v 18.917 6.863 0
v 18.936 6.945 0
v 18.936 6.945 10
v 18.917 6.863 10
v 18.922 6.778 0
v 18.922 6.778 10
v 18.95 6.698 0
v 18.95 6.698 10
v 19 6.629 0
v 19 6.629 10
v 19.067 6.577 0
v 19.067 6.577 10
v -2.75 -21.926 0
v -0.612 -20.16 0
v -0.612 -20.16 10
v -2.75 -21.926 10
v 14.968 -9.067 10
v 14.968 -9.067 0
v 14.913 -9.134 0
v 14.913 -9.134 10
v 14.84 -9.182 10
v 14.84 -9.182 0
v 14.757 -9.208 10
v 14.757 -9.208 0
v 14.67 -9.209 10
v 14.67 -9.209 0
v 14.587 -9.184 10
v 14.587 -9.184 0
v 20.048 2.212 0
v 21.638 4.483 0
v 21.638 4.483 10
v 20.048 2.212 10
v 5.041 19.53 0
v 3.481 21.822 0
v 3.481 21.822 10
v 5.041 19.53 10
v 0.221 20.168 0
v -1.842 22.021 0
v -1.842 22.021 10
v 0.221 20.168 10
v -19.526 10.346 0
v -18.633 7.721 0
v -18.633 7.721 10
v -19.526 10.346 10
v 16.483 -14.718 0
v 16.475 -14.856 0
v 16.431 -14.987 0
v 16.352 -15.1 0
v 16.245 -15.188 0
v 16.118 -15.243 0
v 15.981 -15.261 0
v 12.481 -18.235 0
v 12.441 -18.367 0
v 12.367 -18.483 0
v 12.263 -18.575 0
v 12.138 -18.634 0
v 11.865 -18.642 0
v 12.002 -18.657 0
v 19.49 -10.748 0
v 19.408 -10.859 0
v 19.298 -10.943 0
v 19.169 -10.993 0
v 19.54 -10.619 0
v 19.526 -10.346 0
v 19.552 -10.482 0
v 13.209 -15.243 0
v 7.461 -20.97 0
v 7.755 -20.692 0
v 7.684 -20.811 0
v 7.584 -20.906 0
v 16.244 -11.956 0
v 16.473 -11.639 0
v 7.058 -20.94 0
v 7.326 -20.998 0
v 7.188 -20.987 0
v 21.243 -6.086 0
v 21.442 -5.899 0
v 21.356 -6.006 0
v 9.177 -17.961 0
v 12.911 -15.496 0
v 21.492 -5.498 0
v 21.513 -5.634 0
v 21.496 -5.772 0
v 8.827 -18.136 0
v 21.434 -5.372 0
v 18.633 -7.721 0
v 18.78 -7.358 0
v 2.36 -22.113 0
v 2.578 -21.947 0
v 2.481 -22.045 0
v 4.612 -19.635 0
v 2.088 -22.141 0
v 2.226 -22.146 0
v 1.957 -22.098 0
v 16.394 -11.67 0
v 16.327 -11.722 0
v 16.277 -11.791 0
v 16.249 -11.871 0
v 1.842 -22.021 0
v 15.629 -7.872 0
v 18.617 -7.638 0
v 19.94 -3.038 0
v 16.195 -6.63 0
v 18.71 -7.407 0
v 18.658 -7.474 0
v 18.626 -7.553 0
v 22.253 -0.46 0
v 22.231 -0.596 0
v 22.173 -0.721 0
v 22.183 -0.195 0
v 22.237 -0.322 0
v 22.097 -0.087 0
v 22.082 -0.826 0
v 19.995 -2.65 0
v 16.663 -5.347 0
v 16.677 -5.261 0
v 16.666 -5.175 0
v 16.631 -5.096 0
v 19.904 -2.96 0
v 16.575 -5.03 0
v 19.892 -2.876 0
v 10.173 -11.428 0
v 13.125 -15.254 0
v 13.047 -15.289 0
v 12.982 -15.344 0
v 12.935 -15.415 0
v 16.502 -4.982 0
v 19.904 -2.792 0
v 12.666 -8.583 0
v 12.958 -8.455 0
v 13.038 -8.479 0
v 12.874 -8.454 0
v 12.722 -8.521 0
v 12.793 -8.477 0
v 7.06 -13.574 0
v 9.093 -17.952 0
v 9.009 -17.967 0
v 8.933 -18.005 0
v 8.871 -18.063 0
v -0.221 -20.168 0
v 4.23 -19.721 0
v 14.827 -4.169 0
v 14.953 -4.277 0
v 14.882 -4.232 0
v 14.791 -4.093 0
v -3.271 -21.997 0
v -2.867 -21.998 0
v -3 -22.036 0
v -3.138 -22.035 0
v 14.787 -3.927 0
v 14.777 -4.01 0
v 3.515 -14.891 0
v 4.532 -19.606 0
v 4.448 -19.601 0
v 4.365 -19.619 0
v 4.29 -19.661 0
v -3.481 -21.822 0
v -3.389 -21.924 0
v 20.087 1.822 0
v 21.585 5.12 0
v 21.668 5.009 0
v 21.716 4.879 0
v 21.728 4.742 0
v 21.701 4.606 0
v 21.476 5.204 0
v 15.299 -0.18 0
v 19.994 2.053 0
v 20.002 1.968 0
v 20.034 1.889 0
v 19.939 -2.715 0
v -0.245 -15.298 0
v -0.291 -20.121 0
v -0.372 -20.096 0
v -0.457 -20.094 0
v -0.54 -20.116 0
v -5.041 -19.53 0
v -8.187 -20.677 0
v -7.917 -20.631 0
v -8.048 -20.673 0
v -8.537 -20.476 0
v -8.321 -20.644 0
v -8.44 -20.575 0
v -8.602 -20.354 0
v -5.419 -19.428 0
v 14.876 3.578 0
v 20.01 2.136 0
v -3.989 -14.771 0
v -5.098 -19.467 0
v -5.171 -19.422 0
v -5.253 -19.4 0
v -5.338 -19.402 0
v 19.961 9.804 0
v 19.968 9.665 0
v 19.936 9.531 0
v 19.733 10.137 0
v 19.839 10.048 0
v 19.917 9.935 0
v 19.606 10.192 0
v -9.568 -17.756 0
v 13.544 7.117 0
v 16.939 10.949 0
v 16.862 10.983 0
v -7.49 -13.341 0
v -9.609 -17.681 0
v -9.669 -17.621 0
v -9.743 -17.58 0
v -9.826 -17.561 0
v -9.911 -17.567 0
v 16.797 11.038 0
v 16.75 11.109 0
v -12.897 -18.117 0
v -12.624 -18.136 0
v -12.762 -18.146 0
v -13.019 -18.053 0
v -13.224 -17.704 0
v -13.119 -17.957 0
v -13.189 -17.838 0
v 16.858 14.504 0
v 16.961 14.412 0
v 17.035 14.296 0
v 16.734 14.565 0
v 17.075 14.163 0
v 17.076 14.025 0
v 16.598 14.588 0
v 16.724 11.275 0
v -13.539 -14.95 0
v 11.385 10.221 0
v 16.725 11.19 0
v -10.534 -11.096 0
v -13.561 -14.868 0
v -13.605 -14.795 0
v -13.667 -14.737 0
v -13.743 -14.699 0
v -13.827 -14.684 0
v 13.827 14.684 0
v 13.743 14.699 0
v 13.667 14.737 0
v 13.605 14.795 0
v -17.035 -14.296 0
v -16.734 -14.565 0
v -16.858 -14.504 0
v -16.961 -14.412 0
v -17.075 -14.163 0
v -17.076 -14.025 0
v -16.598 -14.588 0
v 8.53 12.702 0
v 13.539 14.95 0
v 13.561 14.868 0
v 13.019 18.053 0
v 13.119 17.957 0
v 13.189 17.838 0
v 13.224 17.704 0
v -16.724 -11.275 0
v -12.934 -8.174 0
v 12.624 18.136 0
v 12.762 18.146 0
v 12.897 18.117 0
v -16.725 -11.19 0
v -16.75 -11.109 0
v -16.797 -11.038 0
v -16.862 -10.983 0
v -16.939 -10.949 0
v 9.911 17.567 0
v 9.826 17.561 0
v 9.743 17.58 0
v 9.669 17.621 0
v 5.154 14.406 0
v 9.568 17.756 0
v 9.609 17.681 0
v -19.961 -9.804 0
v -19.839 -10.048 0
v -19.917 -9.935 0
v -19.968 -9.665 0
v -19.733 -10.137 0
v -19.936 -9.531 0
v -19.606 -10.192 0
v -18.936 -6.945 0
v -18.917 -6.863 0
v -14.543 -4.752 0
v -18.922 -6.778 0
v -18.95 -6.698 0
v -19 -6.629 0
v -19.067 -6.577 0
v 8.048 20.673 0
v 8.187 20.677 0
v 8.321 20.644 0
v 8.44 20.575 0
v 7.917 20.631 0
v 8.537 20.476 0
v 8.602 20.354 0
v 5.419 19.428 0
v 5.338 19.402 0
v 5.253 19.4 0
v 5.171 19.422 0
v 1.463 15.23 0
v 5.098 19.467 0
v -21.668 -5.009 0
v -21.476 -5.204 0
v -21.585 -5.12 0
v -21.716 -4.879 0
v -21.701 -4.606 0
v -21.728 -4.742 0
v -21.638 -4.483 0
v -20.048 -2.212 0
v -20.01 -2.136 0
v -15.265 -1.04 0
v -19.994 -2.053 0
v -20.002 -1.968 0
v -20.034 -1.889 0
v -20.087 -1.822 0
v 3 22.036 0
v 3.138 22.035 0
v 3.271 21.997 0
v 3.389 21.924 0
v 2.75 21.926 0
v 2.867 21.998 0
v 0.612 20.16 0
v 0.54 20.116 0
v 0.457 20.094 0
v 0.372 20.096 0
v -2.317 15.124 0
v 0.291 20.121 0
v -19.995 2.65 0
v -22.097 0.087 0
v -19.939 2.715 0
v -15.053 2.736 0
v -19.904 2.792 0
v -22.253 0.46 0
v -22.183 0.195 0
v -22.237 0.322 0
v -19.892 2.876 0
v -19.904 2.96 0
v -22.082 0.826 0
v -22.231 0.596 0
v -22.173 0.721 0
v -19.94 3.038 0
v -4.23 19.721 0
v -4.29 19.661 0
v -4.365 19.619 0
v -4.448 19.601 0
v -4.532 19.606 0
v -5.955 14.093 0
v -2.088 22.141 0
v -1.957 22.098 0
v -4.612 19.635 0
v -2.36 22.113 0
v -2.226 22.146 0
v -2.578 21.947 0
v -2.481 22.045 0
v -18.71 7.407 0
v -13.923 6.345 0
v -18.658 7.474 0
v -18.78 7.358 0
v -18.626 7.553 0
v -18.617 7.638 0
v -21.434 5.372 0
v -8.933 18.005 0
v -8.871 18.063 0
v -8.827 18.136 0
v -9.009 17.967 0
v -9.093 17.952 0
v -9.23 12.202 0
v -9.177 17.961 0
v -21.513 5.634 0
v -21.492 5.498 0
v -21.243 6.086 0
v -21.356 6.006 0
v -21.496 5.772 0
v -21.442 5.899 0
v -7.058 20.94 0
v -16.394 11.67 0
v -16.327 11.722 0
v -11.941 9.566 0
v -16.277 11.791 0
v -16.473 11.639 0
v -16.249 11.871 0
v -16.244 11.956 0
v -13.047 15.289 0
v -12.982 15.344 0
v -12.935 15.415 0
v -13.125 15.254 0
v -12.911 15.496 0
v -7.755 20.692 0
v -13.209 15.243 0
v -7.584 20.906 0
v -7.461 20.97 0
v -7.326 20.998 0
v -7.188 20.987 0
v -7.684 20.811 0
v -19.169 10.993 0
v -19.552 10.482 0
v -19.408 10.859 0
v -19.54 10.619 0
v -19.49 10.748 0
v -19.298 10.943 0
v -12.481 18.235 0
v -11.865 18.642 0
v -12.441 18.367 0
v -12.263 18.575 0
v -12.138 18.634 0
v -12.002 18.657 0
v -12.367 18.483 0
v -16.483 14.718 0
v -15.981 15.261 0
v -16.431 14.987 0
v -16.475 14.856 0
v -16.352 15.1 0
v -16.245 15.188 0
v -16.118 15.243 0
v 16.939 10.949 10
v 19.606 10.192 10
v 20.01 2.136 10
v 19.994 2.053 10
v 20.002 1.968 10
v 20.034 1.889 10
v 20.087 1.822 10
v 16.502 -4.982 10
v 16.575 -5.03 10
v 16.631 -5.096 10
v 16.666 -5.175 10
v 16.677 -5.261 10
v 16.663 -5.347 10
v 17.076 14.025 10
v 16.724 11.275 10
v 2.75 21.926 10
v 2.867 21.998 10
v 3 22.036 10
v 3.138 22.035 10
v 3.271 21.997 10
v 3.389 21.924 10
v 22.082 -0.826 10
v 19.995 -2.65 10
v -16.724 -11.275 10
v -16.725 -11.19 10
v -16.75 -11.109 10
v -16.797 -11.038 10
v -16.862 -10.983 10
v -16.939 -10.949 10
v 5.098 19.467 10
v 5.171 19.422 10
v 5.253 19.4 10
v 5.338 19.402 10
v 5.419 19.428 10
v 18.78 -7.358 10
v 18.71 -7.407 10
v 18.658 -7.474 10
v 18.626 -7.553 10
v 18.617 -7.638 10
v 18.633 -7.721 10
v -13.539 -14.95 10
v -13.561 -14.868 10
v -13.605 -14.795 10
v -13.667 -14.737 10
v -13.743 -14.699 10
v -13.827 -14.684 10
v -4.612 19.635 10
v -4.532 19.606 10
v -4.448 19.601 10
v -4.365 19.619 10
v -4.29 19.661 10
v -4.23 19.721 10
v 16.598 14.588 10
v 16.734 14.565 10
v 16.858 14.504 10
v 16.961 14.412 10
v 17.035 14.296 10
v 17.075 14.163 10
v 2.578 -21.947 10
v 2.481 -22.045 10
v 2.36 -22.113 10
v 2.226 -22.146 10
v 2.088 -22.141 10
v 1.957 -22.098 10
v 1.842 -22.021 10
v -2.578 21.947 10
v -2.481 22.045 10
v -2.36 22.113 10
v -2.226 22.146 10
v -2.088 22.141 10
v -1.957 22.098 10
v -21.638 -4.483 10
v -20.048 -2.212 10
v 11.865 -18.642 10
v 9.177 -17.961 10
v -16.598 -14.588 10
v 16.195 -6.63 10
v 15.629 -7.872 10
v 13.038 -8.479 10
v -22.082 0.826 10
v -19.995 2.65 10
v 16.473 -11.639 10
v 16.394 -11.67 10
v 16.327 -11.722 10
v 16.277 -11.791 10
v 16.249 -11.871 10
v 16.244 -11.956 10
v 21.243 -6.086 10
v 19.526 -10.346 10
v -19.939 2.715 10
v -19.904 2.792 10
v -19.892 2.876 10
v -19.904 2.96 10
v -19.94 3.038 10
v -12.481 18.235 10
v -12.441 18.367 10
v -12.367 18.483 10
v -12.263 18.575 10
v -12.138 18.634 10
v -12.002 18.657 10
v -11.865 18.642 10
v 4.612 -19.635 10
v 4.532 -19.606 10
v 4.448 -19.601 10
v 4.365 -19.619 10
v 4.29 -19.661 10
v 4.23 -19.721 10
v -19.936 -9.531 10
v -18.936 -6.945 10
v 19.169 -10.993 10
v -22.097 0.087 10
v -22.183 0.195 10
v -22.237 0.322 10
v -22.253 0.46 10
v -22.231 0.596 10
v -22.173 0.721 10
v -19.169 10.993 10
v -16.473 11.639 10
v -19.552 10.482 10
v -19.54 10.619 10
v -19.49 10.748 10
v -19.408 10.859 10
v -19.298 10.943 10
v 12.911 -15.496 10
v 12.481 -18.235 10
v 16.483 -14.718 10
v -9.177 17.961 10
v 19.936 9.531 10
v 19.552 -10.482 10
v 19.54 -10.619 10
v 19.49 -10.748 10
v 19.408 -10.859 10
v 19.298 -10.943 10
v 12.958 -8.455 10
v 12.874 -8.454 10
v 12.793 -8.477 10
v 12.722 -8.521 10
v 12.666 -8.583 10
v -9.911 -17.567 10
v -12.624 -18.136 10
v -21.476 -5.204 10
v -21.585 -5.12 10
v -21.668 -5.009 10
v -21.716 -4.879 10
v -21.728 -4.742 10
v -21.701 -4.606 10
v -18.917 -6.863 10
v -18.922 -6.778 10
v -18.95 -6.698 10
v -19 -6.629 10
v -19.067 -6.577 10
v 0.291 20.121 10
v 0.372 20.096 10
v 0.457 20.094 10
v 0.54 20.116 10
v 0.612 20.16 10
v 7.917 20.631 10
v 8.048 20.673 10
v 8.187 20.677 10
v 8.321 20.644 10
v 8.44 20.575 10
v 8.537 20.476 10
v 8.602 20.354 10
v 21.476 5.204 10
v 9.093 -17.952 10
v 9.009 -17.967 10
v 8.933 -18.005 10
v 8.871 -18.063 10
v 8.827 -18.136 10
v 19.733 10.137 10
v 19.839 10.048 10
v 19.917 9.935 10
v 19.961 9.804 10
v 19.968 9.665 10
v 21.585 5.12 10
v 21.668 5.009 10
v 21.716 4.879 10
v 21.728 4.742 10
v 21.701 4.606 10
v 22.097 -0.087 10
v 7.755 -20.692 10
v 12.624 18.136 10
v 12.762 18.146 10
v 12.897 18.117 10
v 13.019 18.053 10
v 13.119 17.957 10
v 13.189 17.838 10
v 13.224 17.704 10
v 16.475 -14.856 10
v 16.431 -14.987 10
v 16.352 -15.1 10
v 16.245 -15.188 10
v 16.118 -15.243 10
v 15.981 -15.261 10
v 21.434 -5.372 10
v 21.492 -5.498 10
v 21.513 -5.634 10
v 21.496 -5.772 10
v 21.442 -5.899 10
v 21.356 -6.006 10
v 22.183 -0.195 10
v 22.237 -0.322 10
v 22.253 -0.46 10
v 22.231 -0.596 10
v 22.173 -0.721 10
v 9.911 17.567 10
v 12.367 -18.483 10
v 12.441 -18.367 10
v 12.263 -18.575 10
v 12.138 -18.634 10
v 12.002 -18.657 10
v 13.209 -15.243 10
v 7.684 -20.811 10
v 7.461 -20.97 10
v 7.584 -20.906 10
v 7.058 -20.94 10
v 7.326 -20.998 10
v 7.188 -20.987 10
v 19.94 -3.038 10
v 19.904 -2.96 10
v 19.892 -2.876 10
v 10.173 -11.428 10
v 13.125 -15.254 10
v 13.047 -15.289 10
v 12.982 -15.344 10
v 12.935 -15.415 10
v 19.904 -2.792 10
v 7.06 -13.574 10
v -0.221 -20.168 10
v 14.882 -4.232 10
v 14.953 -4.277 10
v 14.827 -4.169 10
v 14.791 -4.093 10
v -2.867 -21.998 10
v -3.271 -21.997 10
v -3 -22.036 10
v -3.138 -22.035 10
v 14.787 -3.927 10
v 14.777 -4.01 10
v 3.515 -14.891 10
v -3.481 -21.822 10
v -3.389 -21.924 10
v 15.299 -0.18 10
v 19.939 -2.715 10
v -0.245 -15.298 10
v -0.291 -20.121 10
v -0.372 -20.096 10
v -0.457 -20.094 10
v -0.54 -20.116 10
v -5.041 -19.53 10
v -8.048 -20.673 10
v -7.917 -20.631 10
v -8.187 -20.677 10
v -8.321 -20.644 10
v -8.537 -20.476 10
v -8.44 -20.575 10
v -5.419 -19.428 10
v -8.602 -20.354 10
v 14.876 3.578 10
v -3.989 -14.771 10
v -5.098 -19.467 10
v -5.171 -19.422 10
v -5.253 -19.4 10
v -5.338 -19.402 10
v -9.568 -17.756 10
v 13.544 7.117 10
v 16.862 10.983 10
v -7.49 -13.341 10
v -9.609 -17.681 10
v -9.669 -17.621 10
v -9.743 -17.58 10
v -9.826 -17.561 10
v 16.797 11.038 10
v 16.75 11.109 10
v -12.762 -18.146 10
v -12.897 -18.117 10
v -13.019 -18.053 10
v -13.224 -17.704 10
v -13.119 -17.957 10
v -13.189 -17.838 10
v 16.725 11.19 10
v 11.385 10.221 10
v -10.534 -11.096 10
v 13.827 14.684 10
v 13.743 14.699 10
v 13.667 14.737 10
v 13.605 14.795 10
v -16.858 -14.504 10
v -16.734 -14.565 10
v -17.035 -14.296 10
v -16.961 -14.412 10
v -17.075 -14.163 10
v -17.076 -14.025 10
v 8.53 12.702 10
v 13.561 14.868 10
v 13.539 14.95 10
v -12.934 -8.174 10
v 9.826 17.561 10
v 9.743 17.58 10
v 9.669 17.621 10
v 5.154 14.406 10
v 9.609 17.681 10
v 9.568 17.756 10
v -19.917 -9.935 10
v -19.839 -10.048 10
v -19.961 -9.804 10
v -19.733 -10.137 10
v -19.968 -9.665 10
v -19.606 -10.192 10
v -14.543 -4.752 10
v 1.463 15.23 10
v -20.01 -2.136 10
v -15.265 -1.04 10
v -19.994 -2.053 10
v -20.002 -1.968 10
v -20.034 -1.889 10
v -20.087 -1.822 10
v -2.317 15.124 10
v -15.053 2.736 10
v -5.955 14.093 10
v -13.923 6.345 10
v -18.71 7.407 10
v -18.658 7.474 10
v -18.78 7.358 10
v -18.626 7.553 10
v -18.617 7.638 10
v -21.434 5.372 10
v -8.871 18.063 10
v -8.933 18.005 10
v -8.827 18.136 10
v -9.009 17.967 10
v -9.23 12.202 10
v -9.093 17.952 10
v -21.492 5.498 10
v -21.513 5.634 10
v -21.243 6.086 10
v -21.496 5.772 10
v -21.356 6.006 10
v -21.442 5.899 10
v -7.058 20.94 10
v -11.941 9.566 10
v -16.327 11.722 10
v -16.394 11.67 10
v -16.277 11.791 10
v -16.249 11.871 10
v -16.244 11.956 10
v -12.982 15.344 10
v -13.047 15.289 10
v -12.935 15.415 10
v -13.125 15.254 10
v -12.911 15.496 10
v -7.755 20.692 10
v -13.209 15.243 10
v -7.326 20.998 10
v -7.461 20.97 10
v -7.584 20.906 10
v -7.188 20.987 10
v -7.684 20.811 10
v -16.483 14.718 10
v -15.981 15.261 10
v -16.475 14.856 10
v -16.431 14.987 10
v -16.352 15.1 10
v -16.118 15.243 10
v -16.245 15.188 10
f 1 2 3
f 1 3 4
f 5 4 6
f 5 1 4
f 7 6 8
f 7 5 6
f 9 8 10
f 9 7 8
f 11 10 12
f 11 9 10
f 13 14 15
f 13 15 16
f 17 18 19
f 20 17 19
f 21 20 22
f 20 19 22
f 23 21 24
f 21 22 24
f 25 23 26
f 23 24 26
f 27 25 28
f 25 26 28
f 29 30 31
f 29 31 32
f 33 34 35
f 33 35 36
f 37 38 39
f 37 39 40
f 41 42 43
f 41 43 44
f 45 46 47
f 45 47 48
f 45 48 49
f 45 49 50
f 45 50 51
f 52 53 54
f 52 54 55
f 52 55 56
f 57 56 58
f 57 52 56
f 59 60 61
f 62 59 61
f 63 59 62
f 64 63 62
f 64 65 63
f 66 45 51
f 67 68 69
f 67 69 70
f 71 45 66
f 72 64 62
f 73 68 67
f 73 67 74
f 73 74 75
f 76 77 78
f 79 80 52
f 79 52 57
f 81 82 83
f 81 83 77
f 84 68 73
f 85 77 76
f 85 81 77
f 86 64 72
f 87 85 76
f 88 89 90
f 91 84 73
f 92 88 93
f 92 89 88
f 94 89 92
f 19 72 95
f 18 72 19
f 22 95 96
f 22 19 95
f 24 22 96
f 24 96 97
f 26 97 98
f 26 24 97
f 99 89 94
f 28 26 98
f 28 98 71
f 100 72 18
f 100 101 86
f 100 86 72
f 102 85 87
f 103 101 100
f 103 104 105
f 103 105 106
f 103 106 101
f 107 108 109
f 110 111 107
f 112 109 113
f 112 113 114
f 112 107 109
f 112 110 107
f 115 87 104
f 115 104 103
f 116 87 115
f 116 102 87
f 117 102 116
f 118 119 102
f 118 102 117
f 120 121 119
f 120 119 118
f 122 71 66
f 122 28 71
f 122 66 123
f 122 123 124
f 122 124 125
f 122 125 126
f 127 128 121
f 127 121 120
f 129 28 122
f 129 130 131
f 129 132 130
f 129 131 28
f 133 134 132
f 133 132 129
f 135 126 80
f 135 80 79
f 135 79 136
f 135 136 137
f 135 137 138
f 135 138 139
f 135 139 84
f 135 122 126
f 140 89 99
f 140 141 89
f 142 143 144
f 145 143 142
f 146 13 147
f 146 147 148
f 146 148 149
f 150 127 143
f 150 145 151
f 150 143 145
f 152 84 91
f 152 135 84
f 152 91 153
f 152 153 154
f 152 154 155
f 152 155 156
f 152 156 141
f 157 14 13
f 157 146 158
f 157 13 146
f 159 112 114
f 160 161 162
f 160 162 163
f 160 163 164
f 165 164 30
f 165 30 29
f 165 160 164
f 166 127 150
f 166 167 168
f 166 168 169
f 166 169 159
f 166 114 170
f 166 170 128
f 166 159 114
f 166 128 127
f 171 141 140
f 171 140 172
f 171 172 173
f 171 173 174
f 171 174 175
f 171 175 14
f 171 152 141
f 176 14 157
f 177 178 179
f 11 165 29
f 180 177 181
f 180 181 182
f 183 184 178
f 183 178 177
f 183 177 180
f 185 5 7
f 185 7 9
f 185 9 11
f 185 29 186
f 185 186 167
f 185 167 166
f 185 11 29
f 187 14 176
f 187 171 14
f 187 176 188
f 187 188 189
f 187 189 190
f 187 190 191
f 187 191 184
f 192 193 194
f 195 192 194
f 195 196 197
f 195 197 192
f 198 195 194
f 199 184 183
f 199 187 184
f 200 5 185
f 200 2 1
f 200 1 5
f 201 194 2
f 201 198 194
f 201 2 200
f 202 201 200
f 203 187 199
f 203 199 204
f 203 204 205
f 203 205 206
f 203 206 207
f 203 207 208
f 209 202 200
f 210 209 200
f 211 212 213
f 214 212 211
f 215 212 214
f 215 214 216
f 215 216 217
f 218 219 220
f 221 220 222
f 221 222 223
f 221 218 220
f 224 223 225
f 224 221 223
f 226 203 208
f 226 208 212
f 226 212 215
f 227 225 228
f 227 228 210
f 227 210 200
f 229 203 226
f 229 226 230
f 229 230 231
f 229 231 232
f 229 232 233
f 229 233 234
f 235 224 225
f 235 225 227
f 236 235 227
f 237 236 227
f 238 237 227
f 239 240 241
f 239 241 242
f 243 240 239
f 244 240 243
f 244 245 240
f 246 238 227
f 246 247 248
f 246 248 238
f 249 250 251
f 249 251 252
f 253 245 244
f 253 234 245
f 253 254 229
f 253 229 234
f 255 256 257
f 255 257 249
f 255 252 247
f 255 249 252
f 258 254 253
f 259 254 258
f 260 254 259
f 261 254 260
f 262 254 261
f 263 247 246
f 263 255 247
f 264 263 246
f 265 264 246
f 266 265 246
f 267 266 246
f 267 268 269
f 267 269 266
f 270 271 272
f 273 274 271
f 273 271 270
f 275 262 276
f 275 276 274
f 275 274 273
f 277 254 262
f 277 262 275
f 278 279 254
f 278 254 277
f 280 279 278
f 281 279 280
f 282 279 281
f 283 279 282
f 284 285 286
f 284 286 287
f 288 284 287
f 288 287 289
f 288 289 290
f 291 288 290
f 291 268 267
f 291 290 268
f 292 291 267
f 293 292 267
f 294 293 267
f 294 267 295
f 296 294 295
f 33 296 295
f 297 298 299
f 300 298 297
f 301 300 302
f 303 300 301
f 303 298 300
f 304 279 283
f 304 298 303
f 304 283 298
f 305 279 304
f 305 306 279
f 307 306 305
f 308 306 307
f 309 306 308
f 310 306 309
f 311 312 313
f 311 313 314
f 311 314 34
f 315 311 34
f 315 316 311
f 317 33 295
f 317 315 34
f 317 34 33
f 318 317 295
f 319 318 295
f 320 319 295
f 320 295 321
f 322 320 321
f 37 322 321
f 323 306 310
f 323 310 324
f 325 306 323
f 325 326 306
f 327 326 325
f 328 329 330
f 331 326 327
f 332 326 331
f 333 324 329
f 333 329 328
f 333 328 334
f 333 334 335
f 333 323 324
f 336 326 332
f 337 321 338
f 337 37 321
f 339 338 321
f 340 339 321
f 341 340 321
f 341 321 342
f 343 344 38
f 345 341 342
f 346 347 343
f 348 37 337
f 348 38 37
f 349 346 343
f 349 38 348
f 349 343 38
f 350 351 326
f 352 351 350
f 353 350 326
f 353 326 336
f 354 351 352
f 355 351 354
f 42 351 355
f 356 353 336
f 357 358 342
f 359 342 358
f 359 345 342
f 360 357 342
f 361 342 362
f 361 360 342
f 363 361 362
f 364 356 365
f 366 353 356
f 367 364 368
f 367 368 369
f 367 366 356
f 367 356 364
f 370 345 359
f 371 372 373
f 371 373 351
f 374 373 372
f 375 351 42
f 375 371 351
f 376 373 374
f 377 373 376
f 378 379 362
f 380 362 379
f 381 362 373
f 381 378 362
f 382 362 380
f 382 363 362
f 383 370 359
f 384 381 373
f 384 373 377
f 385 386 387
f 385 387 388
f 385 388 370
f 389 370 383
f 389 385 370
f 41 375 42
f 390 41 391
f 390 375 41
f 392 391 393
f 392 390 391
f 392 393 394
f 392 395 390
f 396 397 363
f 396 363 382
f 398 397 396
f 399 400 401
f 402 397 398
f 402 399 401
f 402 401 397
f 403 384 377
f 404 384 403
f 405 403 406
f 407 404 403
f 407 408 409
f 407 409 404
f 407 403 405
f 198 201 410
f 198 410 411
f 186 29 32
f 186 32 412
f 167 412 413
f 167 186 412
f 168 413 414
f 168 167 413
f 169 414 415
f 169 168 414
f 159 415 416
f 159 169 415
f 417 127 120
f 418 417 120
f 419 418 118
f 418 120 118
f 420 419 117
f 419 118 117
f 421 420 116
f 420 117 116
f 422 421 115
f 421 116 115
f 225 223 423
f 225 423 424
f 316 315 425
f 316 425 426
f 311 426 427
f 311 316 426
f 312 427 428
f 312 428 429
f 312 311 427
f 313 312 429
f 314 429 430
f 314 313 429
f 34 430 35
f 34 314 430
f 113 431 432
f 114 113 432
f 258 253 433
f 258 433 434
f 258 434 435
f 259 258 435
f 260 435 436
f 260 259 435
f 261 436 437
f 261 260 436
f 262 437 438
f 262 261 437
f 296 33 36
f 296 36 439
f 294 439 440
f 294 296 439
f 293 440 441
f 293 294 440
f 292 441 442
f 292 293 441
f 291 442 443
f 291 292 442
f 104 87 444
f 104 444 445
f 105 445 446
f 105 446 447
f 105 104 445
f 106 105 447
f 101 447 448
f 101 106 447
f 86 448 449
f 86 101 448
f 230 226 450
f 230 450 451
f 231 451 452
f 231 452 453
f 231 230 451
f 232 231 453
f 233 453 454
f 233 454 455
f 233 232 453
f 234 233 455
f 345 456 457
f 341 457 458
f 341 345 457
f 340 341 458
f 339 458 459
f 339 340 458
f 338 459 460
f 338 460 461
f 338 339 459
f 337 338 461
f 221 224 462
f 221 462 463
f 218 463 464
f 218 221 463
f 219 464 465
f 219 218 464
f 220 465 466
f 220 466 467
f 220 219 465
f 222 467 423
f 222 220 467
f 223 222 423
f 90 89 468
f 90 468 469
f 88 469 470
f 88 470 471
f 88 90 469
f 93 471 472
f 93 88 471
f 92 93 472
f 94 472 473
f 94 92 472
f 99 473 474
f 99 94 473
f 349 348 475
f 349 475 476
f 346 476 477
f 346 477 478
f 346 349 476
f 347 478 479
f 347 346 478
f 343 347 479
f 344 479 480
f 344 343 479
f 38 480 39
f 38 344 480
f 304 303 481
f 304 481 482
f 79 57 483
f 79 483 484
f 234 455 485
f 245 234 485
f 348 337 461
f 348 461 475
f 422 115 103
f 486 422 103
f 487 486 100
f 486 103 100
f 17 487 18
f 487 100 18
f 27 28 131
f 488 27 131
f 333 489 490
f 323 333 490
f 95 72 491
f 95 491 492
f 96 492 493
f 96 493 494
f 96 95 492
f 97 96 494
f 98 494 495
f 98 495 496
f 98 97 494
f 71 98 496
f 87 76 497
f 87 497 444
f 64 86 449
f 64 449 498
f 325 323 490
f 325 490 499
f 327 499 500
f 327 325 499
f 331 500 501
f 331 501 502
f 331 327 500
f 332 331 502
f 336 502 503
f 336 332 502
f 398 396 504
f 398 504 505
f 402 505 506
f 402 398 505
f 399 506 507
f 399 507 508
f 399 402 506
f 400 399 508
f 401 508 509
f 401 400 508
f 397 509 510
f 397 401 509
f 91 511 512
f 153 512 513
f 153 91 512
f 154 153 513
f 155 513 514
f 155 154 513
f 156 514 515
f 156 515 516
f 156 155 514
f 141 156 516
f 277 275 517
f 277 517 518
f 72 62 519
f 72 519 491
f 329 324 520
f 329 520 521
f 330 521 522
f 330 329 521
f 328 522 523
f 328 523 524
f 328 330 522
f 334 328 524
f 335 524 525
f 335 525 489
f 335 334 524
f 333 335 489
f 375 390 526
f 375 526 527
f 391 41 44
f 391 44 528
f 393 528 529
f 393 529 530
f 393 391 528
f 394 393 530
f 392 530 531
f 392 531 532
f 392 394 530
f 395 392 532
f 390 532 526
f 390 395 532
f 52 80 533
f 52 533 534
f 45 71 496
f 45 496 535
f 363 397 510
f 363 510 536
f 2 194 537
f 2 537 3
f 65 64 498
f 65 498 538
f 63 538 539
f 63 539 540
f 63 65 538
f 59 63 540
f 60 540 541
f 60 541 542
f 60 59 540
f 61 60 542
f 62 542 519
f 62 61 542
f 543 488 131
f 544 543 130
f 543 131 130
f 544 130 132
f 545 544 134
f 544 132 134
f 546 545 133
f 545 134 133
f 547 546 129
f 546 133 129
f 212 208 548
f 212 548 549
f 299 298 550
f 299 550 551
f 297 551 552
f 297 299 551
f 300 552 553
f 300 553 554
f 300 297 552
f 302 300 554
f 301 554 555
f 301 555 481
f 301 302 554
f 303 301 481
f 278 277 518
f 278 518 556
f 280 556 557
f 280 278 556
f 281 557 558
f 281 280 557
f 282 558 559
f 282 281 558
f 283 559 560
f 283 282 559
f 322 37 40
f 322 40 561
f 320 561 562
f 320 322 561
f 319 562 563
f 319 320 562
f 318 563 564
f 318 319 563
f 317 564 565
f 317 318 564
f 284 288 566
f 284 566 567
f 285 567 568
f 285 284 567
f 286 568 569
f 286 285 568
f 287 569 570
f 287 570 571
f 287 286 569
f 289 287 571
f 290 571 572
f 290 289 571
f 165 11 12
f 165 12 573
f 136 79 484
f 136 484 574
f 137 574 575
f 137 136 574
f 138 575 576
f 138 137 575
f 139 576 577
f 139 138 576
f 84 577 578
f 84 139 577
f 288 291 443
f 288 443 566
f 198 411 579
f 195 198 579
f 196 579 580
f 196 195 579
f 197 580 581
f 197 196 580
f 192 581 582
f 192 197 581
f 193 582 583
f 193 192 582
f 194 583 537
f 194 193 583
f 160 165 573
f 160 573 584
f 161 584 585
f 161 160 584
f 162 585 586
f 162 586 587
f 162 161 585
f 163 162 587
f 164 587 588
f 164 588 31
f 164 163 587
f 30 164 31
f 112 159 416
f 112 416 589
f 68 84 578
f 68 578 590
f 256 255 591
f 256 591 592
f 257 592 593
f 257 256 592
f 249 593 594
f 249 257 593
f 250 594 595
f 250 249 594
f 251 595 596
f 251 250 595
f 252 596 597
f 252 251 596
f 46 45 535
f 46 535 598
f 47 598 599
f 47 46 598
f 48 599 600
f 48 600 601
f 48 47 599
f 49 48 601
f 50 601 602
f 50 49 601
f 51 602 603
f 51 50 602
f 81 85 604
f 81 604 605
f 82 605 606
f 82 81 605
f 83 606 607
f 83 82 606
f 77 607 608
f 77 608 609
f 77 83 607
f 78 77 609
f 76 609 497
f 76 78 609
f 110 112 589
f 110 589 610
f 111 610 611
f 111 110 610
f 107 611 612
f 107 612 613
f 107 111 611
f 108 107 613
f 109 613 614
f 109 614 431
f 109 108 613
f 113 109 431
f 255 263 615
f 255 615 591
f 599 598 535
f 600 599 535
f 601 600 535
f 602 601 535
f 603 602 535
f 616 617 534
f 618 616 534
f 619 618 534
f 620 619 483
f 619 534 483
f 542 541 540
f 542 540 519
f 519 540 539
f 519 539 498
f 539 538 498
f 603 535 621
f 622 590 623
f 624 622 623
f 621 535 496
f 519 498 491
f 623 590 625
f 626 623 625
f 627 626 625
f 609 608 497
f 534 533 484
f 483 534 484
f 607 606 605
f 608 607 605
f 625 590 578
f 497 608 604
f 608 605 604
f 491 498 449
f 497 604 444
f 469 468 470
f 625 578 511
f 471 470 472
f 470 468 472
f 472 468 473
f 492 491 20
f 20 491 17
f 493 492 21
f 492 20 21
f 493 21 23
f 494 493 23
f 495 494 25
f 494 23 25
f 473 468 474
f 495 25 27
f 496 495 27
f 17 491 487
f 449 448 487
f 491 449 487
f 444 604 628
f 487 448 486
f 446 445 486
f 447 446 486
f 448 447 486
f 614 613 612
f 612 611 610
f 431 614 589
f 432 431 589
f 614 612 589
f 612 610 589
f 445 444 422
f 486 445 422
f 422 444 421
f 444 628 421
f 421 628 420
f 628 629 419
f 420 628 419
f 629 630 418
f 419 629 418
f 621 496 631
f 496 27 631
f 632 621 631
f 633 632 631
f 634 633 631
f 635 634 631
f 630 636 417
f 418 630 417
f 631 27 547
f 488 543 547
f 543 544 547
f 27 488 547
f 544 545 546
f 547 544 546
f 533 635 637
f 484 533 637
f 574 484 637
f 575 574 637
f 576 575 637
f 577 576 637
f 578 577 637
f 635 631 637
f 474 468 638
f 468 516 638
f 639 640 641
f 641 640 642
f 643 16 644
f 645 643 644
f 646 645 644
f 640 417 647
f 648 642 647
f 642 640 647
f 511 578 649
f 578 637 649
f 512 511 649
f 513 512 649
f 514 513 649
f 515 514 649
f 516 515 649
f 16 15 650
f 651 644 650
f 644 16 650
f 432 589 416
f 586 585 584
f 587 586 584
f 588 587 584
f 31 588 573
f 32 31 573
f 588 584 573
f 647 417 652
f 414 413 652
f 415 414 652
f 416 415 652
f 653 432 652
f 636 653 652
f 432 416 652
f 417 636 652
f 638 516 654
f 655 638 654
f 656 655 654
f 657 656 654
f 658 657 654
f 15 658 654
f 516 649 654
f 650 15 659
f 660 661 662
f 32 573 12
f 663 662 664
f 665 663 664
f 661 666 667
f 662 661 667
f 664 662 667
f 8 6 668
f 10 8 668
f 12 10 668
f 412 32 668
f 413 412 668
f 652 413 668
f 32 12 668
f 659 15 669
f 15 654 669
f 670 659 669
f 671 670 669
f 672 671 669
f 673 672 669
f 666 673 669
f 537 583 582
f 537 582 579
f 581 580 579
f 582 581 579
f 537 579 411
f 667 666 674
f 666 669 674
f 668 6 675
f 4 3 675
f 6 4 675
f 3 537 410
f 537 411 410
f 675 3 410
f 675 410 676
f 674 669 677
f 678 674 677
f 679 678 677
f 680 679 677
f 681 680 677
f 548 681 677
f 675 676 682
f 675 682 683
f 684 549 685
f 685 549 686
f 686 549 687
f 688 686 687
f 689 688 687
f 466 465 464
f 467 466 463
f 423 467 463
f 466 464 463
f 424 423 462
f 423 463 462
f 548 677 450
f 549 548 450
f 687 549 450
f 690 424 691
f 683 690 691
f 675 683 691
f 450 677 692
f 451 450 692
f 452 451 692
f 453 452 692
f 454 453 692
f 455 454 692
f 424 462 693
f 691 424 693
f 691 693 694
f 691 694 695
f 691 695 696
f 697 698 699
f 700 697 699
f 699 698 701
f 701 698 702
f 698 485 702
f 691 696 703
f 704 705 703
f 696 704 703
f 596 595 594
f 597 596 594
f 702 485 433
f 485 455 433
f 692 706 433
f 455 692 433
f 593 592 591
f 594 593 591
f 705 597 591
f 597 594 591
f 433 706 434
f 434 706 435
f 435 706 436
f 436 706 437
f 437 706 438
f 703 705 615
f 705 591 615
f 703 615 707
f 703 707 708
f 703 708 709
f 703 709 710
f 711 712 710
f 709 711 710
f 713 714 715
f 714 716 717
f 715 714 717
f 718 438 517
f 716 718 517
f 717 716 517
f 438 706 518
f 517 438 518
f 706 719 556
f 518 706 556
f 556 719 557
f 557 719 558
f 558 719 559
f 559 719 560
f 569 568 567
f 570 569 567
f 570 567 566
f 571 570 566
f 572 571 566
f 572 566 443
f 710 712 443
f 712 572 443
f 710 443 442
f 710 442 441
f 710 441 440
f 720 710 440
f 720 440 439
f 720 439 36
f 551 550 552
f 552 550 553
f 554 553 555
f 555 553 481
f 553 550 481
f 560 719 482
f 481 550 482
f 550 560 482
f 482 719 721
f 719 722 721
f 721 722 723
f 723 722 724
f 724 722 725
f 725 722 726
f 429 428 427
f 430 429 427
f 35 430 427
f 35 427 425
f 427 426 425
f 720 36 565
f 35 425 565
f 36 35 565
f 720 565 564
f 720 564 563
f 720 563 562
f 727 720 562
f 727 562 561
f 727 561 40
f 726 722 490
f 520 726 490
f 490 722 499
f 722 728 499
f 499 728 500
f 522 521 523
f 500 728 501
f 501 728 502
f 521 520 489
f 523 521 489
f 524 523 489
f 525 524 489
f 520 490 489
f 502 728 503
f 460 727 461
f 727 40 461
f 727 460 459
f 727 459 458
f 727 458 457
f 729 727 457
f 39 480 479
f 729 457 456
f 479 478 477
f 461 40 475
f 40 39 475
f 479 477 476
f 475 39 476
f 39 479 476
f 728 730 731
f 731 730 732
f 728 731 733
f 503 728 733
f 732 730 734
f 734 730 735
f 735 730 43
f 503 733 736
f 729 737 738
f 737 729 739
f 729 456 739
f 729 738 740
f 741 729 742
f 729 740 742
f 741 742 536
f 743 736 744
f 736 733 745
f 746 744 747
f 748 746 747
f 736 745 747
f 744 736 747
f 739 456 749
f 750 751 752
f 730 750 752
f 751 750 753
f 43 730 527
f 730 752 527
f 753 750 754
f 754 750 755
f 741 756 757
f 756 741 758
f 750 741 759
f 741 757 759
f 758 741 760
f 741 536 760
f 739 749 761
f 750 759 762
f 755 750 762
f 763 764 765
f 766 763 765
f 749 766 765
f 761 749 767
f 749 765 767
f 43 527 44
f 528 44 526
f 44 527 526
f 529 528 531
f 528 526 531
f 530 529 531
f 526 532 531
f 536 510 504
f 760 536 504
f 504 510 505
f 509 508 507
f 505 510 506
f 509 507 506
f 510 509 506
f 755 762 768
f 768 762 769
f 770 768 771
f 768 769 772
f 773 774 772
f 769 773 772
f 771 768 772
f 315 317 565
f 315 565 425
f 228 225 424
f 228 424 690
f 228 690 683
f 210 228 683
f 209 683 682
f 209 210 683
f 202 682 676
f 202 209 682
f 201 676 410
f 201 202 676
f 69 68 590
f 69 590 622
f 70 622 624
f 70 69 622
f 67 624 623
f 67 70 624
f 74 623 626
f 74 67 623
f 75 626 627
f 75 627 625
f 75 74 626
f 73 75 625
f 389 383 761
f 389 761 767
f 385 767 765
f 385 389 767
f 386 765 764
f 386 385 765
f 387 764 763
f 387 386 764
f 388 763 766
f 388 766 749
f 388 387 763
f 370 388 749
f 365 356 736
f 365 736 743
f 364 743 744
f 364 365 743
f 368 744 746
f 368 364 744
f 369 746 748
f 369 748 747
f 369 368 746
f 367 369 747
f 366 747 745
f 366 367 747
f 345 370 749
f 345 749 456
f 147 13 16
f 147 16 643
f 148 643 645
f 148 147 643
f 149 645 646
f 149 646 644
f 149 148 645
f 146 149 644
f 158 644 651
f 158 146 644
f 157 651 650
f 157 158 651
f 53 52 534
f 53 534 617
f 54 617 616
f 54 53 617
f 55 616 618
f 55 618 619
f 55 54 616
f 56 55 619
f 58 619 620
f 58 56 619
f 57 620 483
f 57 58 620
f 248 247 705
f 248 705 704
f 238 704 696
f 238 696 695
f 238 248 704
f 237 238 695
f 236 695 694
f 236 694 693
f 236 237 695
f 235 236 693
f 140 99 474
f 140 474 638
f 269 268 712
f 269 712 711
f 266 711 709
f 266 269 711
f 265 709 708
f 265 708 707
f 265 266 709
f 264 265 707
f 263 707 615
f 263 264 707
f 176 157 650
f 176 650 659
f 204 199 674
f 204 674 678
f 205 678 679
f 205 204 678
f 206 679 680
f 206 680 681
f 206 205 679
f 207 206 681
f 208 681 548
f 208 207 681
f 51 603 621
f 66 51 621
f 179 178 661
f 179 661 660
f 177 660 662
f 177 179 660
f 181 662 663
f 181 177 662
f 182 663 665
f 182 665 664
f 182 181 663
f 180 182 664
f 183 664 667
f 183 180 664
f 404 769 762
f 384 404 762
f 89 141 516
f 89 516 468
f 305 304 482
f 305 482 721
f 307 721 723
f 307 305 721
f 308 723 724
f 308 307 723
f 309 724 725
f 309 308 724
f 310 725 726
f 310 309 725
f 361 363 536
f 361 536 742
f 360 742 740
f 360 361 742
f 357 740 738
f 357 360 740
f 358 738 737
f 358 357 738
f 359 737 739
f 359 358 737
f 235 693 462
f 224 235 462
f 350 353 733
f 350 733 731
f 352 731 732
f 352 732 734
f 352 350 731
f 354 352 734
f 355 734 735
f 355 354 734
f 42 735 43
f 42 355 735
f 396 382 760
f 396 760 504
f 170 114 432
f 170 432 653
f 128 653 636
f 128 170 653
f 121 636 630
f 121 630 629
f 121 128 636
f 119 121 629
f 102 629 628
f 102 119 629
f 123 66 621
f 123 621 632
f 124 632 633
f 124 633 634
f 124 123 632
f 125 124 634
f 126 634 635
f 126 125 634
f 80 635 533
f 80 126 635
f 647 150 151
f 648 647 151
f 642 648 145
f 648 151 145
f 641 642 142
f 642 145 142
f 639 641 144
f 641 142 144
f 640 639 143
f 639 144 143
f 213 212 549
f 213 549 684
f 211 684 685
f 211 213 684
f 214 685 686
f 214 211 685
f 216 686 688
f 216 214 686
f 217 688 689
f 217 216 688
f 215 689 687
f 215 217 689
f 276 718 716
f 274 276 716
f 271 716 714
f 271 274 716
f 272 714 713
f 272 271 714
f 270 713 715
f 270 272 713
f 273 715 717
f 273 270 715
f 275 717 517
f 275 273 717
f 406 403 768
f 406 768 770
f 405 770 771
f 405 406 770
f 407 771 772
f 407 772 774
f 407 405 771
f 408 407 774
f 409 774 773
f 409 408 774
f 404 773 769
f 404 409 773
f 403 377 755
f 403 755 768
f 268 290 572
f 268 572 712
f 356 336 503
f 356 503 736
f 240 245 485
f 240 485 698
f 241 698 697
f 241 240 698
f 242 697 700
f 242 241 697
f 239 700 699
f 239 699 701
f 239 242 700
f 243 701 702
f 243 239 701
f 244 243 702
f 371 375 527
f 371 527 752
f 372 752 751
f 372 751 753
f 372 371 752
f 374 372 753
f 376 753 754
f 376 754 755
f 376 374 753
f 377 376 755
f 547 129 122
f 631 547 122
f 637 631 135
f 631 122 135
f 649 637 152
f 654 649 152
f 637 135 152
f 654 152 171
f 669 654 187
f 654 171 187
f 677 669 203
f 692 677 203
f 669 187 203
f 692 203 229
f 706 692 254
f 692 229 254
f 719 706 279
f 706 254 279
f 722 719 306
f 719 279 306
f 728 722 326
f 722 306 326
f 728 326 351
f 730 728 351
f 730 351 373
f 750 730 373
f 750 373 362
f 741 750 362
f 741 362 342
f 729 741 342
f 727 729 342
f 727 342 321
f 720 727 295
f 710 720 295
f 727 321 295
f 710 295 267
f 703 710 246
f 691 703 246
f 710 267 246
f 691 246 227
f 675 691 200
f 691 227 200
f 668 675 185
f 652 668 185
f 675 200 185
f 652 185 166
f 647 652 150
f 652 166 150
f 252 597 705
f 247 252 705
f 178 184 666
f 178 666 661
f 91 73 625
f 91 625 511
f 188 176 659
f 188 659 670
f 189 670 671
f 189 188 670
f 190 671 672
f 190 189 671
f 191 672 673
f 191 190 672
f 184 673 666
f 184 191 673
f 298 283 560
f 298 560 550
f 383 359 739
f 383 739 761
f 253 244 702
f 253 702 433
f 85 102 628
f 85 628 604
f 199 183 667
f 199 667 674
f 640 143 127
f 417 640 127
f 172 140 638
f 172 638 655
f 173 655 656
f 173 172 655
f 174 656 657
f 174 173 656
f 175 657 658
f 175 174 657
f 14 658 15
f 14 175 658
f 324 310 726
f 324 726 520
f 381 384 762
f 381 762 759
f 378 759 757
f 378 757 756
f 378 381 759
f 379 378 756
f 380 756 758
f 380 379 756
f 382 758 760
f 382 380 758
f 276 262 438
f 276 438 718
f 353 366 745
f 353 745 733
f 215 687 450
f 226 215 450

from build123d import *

# Parameters (mm, degrees)
BOSS_EXTRU_1_DEPTH = 10


with BuildPart() as part:
    # Esquisse1 → Boss.-Extru.1 (new body)
    with BuildSketch(Plane.XY):
        with BuildLine():
            Line((19.936371996, 9.53093454), (18.936003853, 6.945485686))
            ThreePointArc((18.936003853, 6.945485686), (18.933149277, 6.736662361), (19.067266911, 6.576575542))
            Line((19.067266911, 6.576575542), (21.475916438, 5.204099801))
            ThreePointArc((21.475916438, 5.204099801), (21.716214662, 4.879285253), (21.63795919, 4.482896797))
            Line((21.63795919, 4.482896797), (20.047921516, 2.211980154))
            ThreePointArc((20.047921516, 2.211980154), (19.995175197, 2.009908), (20.087084333, 1.822376562))
            Line((20.087084333, 1.822376562), (22.097287938, -0.08664509))
            ThreePointArc((22.097287938, -0.08664509), (22.252870323, -0.459528247), (22.082026846, -0.825670614))
            Line((22.082026846, -0.825670614), (19.994726852, -2.650077625))
            ThreePointArc((19.994726852, -2.650077625), (19.895154214, -2.833654908), (19.939513426, -3.03773232))
            Line((19.939513426, -3.03773232), (21.434445383, -5.372354483))
            ThreePointArc((21.434445383, -5.372354483), (21.496270047, -5.771635635), (21.242767367, -6.08625305))
            Line((21.242767367, -6.08625305), (18.779511342, -7.358122524))
            ThreePointArc((18.779511342, -7.358122524), (18.638899183, -7.512536093), (18.633130477, -7.72129924))
            Line((18.633130477, -7.72129924), (19.525910774, -10.345842161))
            ThreePointArc((19.525910774, -10.345842161), (19.490384691, -10.748316538), (19.168955462, -10.993124582))
            Line((19.168955462, -10.993124582), (16.472898893, -11.638540088))
            ThreePointArc((16.472898893, -11.638540088), (16.299419082, -11.754815988), (16.243857712, -11.956132315))
            Line((16.243857712, -11.956132315), (16.482601205, -14.718067098))
            ThreePointArc((16.482601205, -14.718067098), (16.351789022, -15.100344354), (15.981113543, -15.261115671))
            Line((15.981113543, -15.261115671), (13.208941437, -15.242568007))
            ThreePointArc((13.208941437, -15.242568007), (13.01267599, -15.313948704), (12.910550982, -15.496118438))
            Line((12.910550982, -15.496118438), (12.481382765, -18.234931474))
            ThreePointArc((12.481382765, -18.234931474), (12.262886811, -18.574795043), (11.864507393, -18.642186189))
            Line((11.864507393, -18.642186189), (9.177328317, -17.960753277))
            ThreePointArc((9.177328317, -17.960753277), (8.969683468, -17.983090385), (8.826929956, -18.135526484))
            Line((8.826929956, -18.135526484), (7.754791727, -20.692047914))
            ThreePointArc((7.754791727, -20.692047914), (7.461310193, -20.96974616), (7.0583792, -20.939840607))
            Line((7.0583792, -20.939840607), (4.612362234, -19.635124852))
            ThreePointArc((4.612362234, -19.635124852), (4.405405547, -19.607120219), (4.230319846, -19.720963651))
            Line((4.230319846, -19.720963651), (2.577520381, -21.946617741))
            ThreePointArc((2.577520381, -21.946617741), (2.226109347, -22.146011853), (1.842043663, -22.020547603))
            Line((1.842043663, -22.020547603), (-0.220657578, -20.168374341))
            ThreePointArc((-0.220657578, -20.168374341), (-0.414898532, -20.091655495), (-0.612141077, -20.160290093))
            Line((-0.612141077, -20.160290093), (-2.74954708, -21.925729918))
            ThreePointArc((-2.74954708, -21.925729918), (-3.138464883, -22.035231834), (-3.481344755, -21.821500413))
            Line((-3.481344755, -21.821500413), (-5.040853572, -19.529511222))
            ThreePointArc((-5.040853572, -19.529511222), (-5.211090216, -19.408536784), (-5.419026585, -19.427973754))
            Line((-5.419026585, -19.427973754), (-7.91682086, -20.630598369))
            ThreePointArc((-7.91682086, -20.630598369), (-8.320642942, -20.643844236), (-8.602410071, -20.354266937))
            Line((-8.602410071, -20.354266937), (-9.56809348, -17.755663898))
            ThreePointArc((-9.56809348, -17.755663898), (-9.704432278, -17.597464462), (-9.910977966, -17.566574199))
            Line((-9.910977966, -17.566574199), (-12.623997787, -18.136491432))
            ThreePointArc((-12.623997787, -18.136491432), (-13.019255477, -18.052711449), (-13.223534582, -17.704117452))
            Line((-13.223534582, -17.704117452), (-13.539270574, -14.949921928))
            ThreePointArc((-13.539270574, -14.949921928), (-13.633788011, -14.76369147), (-13.826939332, -14.684269203))
            Line((-13.826939332, -14.684269203), (-16.597513849, -14.588357536))
            ThreePointArc((-16.597513849, -14.588357536), (-16.961236207, -14.41242069), (-17.076155328, -14.025069012))
            Line((-17.076155328, -14.025069012), (-16.723594475, -11.275344836))
            ThreePointArc((-16.723594475, -11.275344836), (-16.770797541, -11.071906393), (-16.939329244, -10.948567856))
            Line((-16.939329244, -10.948567856), (-19.606442736, -10.192401327))
            ThreePointArc((-19.606442736, -10.192401327), (-19.91749154, -9.934532429), (-19.936371996, -9.53093454))
            Line((-19.936371996, -9.53093454), (-18.936003853, -6.945485686))
            ThreePointArc((-18.936003853, -6.945485686), (-18.933149277, -6.736662361), (-19.067266911, -6.576575542))
            Line((-19.067266911, -6.576575542), (-21.475916438, -5.204099801))
            ThreePointArc((-21.475916438, -5.204099801), (-21.716214662, -4.879285253), (-21.63795919, -4.482896797))
            Line((-21.63795919, -4.482896797), (-20.047921516, -2.211980154))
            ThreePointArc((-20.047921516, -2.211980154), (-19.995175197, -2.009908), (-20.087084333, -1.822376562))
            Line((-20.087084333, -1.822376562), (-22.097287938, 0.08664509))
            ThreePointArc((-22.097287938, 0.08664509), (-22.252870323, 0.459528247), (-22.082026846, 0.825670614))
            Line((-22.082026846, 0.825670614), (-19.994726852, 2.650077625))
            ThreePointArc((-19.994726852, 2.650077625), (-19.895154214, 2.833654908), (-19.939513426, 3.03773232))
            Line((-19.939513426, 3.03773232), (-21.434445383, 5.372354483))
            ThreePointArc((-21.434445383, 5.372354483), (-21.496270047, 5.771635635), (-21.242767367, 6.08625305))
            Line((-21.242767367, 6.08625305), (-18.779511342, 7.358122524))
            ThreePointArc((-18.779511342, 7.358122524), (-18.638899183, 7.512536093), (-18.633130477, 7.72129924))
            Line((-18.633130477, 7.72129924), (-19.525910774, 10.345842161))
            ThreePointArc((-19.525910774, 10.345842161), (-19.490384691, 10.748316538), (-19.168955462, 10.993124582))
            Line((-19.168955462, 10.993124582), (-16.472898893, 11.638540088))
            ThreePointArc((-16.472898893, 11.638540088), (-16.299419082, 11.754815988), (-16.243857712, 11.956132315))
            Line((-16.243857712, 11.956132315), (-16.482601205, 14.718067098))
            ThreePointArc((-16.482601205, 14.718067098), (-16.351789022, 15.100344354), (-15.981113543, 15.261115671))
            Line((-15.981113543, 15.261115671), (-13.208941437, 15.242568007))
            ThreePointArc((-13.208941437, 15.242568007), (-13.01267599, 15.313948704), (-12.910550982, 15.496118438))
            Line((-12.910550982, 15.496118438), (-12.481382765, 18.234931474))
            ThreePointArc((-12.481382765, 18.234931474), (-12.262886811, 18.574795043), (-11.864507393, 18.642186189))
            Line((-11.864507393, 18.642186189), (-9.177328317, 17.960753277))
            ThreePointArc((-9.177328317, 17.960753277), (-8.969683468, 17.983090385), (-8.826929956, 18.135526484))
            Line((-8.826929956, 18.135526484), (-7.754791727, 20.692047914))
            ThreePointArc((-7.754791727, 20.692047914), (-7.461310193, 20.96974616), (-7.0583792, 20.939840607))
            Line((-7.0583792, 20.939840607), (-4.612362234, 19.635124852))
            ThreePointArc((-4.612362234, 19.635124852), (-4.405405547, 19.607120219), (-4.230319846, 19.720963651))
            Line((-4.230319846, 19.720963651), (-2.577520381, 21.946617741))
            ThreePointArc((-2.577520381, 21.946617741), (-2.226109347, 22.146011853), (-1.842043663, 22.020547603))
            Line((-1.842043663, 22.020547603), (0.220657578, 20.168374341))
            ThreePointArc((0.220657578, 20.168374341), (0.414898532, 20.091655495), (0.612141077, 20.160290093))
            Line((0.612141077, 20.160290093), (2.74954708, 21.925729918))
            ThreePointArc((2.74954708, 21.925729918), (3.138464883, 22.035231834), (3.481344755, 21.821500413))
            Line((3.481344755, 21.821500413), (5.040853572, 19.529511222))
            ThreePointArc((5.040853572, 19.529511222), (5.211090216, 19.408536784), (5.419026585, 19.427973754))
            Line((5.419026585, 19.427973754), (7.91682086, 20.630598369))
            ThreePointArc((7.91682086, 20.630598369), (8.320642942, 20.643844236), (8.602410071, 20.354266937))
            Line((8.602410071, 20.354266937), (9.56809348, 17.755663898))
            ThreePointArc((9.56809348, 17.755663898), (9.704432278, 17.597464462), (9.910977966, 17.566574199))
            Line((9.910977966, 17.566574199), (12.623997787, 18.136491432))
            ThreePointArc((12.623997787, 18.136491432), (13.019255477, 18.052711449), (13.223534582, 17.704117452))
            Line((13.223534582, 17.704117452), (13.539270574, 14.949921928))
            ThreePointArc((13.539270574, 14.949921928), (13.633788011, 14.76369147), (13.826939332, 14.684269203))
            Line((13.826939332, 14.684269203), (16.597513849, 14.588357536))
            ThreePointArc((16.597513849, 14.588357536), (16.961236207, 14.41242069), (17.076155328, 14.025069012))
            Line((17.076155328, 14.025069012), (16.723594475, 11.275344836))
            ThreePointArc((16.723594475, 11.275344836), (16.770797541, 11.071906393), (16.939329244, 10.948567856))
            Line((16.939329244, 10.948567856), (19.606442736, 10.192401327))
            ThreePointArc((19.606442736, 10.192401327), (19.91749154, 9.934532429), (19.936371996, 9.53093454))
        make_face()
        with BuildLine():
            Line((14.953030626, -4.277181575), (16.501758042, -4.982426557))
            ThreePointArc((16.501758042, -4.982426557), (16.651785463, -5.134087079), (16.663083329, -5.347116418))
            ThreePointArc((16.663083329, -5.347116418), (15.924531384, -7.256672806), (14.968008895, -9.066901881))
            ThreePointArc((14.968008895, -9.066901881), (14.799864591, -9.198133844), (14.587009397, -9.184458985))
            Line((14.587009397, -9.184458985), (13.038282108, -8.478683252))
            ThreePointArc((13.038282108, -8.478683252), (12.832759155, -8.462847948), (12.665533258, -8.583371557))
            ThreePointArc((12.665533258, -8.583371557), (-13.922503409, 6.344596033), (14.787409001, -3.927153556))
            ThreePointArc((14.787409001, -3.927153556), (14.806182583, -4.132467854), (14.953030626, -4.277181575))
        make_face(mode=Mode.SUBTRACT)
    extrude(amount=BOSS_EXTRU_1_DEPTH)


solid = part.part
